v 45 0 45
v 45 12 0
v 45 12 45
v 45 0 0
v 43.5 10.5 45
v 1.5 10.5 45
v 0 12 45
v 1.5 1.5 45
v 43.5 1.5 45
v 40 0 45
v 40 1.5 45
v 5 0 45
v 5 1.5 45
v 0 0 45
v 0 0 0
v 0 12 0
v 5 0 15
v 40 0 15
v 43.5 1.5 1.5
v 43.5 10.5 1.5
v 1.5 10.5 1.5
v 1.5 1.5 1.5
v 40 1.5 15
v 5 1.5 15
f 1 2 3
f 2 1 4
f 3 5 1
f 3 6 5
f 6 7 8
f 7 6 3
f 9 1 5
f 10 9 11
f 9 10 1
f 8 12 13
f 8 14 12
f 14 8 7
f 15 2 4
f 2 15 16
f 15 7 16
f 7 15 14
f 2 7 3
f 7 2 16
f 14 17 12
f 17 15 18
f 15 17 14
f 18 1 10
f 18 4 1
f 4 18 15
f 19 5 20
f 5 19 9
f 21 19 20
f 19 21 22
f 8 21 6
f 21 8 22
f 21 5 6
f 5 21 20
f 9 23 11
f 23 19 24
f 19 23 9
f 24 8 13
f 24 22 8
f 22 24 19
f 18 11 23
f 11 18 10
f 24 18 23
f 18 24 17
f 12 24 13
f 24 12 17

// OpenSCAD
$fa = 1;
$fs = 0.4;

module light_remote_mount() {
  THICKNESS = 1.5;
  MOUNT_WIDTH = 45;
  MOUNT_THICKNESS = 12;
  MOUNT_HEIGHT = 45;

  difference() {
    cube(size = [ MOUNT_WIDTH, MOUNT_THICKNESS, MOUNT_HEIGHT ]);
    translate([ THICKNESS, THICKNESS, THICKNESS ]) cube(size = [
      MOUNT_WIDTH - 2 * THICKNESS, MOUNT_THICKNESS - 2 * THICKNESS,
      MOUNT_HEIGHT
    ]);
    translate([ 5, -1, 15 ])
        cube(size = [ MOUNT_WIDTH - 2 * 5, THICKNESS + 2, MOUNT_HEIGHT - 10 ]);
  }
}

union() { light_remote_mount(); }
